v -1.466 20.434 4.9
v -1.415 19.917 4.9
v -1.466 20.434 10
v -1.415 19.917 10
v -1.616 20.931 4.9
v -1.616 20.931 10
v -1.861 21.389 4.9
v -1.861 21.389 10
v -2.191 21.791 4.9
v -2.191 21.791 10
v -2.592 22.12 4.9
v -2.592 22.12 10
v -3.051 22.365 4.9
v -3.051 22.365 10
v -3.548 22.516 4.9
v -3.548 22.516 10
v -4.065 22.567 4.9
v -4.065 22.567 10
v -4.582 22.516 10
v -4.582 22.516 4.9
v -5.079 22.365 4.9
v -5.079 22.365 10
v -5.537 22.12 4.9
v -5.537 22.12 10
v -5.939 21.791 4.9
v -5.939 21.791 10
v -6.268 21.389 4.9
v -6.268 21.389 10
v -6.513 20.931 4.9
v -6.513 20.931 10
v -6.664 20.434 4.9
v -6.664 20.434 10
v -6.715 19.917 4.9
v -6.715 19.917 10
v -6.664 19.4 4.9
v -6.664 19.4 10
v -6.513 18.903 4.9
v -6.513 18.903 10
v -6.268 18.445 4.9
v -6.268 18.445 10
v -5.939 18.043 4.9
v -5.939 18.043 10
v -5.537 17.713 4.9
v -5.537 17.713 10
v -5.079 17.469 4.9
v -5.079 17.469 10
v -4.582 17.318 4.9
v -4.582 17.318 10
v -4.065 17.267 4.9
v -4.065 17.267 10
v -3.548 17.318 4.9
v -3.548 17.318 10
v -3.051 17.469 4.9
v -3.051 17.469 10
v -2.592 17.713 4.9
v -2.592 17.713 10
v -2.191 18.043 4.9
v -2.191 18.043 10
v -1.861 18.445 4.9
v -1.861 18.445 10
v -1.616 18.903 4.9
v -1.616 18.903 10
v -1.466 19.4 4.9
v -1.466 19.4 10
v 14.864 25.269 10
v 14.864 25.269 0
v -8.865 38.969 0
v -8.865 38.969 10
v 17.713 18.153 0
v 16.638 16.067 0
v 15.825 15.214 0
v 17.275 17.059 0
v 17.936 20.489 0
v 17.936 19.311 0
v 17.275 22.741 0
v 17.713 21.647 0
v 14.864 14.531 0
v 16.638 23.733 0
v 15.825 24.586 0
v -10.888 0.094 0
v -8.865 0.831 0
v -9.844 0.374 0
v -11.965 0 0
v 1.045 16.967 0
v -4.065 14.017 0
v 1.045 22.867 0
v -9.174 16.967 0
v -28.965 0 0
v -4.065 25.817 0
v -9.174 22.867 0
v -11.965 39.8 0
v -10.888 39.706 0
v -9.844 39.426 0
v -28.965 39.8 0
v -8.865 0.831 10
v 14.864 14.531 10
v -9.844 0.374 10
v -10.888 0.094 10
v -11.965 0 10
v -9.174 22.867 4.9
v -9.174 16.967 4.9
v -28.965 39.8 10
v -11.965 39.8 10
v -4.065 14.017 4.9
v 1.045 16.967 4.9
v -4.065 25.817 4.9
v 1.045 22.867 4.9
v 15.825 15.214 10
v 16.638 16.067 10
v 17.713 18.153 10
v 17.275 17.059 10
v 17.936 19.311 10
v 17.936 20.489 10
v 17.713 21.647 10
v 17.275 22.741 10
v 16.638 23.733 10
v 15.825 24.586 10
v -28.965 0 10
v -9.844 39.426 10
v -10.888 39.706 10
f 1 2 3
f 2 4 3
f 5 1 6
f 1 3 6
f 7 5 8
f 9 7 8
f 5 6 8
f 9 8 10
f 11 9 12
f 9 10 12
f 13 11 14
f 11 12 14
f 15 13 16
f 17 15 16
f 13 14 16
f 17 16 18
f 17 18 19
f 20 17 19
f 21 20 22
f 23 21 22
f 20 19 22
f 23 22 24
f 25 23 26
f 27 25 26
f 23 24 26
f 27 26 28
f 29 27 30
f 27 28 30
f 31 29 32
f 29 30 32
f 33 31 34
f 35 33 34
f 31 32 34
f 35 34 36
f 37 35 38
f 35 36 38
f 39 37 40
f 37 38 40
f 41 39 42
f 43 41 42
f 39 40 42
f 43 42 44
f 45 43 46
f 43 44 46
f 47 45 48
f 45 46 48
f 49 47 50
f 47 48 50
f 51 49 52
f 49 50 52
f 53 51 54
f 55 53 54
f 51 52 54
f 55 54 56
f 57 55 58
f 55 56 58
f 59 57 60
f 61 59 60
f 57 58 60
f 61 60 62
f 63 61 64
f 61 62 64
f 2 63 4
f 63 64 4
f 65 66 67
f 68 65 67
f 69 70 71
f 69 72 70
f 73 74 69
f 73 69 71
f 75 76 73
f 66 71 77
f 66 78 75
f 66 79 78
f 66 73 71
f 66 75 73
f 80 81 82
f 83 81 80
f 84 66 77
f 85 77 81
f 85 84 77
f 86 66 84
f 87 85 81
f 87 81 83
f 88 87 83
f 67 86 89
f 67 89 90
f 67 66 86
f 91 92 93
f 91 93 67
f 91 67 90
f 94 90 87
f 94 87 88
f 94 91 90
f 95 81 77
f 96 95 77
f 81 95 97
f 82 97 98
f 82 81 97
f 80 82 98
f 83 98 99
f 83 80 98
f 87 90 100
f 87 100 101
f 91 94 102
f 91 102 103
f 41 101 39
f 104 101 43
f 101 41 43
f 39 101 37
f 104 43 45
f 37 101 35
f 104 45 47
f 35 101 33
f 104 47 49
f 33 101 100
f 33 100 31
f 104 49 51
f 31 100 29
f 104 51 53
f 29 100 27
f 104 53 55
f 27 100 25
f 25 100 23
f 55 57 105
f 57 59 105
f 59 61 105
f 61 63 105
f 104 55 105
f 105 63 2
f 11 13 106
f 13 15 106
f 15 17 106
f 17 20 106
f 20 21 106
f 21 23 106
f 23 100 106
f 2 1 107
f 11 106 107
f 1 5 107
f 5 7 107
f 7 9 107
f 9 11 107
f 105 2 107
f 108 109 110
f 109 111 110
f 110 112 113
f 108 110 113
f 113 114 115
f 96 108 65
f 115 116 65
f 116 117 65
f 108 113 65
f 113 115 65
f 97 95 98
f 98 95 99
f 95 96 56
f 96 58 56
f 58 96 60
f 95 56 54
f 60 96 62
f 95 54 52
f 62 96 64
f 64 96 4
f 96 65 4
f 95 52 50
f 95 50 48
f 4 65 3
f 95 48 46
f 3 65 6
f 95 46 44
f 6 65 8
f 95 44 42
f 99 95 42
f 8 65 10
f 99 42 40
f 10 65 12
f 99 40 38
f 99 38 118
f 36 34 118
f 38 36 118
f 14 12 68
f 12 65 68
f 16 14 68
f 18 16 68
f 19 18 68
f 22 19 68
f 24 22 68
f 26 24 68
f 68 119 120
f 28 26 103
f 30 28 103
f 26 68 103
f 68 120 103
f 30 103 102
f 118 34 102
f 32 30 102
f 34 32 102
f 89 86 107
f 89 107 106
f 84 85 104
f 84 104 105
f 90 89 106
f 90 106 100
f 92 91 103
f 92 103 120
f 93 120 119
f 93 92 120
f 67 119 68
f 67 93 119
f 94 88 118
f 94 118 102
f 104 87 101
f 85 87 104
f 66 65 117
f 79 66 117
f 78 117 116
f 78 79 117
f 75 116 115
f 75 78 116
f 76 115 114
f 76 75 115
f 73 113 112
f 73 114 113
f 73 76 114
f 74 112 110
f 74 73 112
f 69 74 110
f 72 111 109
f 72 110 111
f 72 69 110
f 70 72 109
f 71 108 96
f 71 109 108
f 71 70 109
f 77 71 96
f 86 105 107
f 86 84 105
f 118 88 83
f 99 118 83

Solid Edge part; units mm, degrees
sketch "Sketch1" plane through (0, 0, 0) normal (0, 0, 1) x (1, 0, 0)
  line L0 (-28.9647, 0) -> (-28.9647, 39.8)
  line L1 (-28.9647, 39.8) -> (-11.9647, 39.8)
  arc A0 (-11.9647, 39.8) -> (-8.8647, 38.9694) centre (-11.9647, 33.6) cw
  line L2 (14.8644, 25.2694) -> (-8.8647, 38.9694)
  arc A1 (14.8644, 14.5306) -> (14.8644, 25.2694) centre (11.7644, 19.9) ccw
  line L3 (-8.8647, 0.8306) -> (14.8644, 14.5306)
  arc A2 (-11.9647, 0) -> (-8.8647, 0.8306) centre (-11.9647, 6.2) ccw
  line L4 (-28.9647, 0) -> (-11.9647, 0)
extrude "Protrusion1" add sketch "Sketch1" along normal blind 10
sketch "Sketch2" plane through (-5.5002, 19.9, 10) normal (0, 0, 1) x (1, 0, 0)
  circle A0 centre (1.4355, 0.0168) radius 2.65
extrude "ExtrudedCutout_1" cut sketch "Sketch2" against normal blind 233.7228
sketch "Sketch3" plane through (-5.5002, 19.9, 0) normal (0, 0, -1) x (1, 0, 0)
  line L0 (-3.6741, -2.9668) -> (-3.6741, 2.9332)
  line L1 (-3.6741, 2.9332) -> (1.4355, 5.8832)
  line L2 (1.4355, 5.8832) -> (6.545, 2.9332)
  line L3 (6.545, 2.9332) -> (6.545, -2.9668)
  line L4 (6.545, -2.9668) -> (1.4355, -5.9168)
  line L5 (1.4355, -5.9168) -> (-3.6741, -2.9668)
  dimension "D1" = 11.8
extrude "ExtrudedCutout_2" cut sketch "Sketch3" against normal blind 4.9
